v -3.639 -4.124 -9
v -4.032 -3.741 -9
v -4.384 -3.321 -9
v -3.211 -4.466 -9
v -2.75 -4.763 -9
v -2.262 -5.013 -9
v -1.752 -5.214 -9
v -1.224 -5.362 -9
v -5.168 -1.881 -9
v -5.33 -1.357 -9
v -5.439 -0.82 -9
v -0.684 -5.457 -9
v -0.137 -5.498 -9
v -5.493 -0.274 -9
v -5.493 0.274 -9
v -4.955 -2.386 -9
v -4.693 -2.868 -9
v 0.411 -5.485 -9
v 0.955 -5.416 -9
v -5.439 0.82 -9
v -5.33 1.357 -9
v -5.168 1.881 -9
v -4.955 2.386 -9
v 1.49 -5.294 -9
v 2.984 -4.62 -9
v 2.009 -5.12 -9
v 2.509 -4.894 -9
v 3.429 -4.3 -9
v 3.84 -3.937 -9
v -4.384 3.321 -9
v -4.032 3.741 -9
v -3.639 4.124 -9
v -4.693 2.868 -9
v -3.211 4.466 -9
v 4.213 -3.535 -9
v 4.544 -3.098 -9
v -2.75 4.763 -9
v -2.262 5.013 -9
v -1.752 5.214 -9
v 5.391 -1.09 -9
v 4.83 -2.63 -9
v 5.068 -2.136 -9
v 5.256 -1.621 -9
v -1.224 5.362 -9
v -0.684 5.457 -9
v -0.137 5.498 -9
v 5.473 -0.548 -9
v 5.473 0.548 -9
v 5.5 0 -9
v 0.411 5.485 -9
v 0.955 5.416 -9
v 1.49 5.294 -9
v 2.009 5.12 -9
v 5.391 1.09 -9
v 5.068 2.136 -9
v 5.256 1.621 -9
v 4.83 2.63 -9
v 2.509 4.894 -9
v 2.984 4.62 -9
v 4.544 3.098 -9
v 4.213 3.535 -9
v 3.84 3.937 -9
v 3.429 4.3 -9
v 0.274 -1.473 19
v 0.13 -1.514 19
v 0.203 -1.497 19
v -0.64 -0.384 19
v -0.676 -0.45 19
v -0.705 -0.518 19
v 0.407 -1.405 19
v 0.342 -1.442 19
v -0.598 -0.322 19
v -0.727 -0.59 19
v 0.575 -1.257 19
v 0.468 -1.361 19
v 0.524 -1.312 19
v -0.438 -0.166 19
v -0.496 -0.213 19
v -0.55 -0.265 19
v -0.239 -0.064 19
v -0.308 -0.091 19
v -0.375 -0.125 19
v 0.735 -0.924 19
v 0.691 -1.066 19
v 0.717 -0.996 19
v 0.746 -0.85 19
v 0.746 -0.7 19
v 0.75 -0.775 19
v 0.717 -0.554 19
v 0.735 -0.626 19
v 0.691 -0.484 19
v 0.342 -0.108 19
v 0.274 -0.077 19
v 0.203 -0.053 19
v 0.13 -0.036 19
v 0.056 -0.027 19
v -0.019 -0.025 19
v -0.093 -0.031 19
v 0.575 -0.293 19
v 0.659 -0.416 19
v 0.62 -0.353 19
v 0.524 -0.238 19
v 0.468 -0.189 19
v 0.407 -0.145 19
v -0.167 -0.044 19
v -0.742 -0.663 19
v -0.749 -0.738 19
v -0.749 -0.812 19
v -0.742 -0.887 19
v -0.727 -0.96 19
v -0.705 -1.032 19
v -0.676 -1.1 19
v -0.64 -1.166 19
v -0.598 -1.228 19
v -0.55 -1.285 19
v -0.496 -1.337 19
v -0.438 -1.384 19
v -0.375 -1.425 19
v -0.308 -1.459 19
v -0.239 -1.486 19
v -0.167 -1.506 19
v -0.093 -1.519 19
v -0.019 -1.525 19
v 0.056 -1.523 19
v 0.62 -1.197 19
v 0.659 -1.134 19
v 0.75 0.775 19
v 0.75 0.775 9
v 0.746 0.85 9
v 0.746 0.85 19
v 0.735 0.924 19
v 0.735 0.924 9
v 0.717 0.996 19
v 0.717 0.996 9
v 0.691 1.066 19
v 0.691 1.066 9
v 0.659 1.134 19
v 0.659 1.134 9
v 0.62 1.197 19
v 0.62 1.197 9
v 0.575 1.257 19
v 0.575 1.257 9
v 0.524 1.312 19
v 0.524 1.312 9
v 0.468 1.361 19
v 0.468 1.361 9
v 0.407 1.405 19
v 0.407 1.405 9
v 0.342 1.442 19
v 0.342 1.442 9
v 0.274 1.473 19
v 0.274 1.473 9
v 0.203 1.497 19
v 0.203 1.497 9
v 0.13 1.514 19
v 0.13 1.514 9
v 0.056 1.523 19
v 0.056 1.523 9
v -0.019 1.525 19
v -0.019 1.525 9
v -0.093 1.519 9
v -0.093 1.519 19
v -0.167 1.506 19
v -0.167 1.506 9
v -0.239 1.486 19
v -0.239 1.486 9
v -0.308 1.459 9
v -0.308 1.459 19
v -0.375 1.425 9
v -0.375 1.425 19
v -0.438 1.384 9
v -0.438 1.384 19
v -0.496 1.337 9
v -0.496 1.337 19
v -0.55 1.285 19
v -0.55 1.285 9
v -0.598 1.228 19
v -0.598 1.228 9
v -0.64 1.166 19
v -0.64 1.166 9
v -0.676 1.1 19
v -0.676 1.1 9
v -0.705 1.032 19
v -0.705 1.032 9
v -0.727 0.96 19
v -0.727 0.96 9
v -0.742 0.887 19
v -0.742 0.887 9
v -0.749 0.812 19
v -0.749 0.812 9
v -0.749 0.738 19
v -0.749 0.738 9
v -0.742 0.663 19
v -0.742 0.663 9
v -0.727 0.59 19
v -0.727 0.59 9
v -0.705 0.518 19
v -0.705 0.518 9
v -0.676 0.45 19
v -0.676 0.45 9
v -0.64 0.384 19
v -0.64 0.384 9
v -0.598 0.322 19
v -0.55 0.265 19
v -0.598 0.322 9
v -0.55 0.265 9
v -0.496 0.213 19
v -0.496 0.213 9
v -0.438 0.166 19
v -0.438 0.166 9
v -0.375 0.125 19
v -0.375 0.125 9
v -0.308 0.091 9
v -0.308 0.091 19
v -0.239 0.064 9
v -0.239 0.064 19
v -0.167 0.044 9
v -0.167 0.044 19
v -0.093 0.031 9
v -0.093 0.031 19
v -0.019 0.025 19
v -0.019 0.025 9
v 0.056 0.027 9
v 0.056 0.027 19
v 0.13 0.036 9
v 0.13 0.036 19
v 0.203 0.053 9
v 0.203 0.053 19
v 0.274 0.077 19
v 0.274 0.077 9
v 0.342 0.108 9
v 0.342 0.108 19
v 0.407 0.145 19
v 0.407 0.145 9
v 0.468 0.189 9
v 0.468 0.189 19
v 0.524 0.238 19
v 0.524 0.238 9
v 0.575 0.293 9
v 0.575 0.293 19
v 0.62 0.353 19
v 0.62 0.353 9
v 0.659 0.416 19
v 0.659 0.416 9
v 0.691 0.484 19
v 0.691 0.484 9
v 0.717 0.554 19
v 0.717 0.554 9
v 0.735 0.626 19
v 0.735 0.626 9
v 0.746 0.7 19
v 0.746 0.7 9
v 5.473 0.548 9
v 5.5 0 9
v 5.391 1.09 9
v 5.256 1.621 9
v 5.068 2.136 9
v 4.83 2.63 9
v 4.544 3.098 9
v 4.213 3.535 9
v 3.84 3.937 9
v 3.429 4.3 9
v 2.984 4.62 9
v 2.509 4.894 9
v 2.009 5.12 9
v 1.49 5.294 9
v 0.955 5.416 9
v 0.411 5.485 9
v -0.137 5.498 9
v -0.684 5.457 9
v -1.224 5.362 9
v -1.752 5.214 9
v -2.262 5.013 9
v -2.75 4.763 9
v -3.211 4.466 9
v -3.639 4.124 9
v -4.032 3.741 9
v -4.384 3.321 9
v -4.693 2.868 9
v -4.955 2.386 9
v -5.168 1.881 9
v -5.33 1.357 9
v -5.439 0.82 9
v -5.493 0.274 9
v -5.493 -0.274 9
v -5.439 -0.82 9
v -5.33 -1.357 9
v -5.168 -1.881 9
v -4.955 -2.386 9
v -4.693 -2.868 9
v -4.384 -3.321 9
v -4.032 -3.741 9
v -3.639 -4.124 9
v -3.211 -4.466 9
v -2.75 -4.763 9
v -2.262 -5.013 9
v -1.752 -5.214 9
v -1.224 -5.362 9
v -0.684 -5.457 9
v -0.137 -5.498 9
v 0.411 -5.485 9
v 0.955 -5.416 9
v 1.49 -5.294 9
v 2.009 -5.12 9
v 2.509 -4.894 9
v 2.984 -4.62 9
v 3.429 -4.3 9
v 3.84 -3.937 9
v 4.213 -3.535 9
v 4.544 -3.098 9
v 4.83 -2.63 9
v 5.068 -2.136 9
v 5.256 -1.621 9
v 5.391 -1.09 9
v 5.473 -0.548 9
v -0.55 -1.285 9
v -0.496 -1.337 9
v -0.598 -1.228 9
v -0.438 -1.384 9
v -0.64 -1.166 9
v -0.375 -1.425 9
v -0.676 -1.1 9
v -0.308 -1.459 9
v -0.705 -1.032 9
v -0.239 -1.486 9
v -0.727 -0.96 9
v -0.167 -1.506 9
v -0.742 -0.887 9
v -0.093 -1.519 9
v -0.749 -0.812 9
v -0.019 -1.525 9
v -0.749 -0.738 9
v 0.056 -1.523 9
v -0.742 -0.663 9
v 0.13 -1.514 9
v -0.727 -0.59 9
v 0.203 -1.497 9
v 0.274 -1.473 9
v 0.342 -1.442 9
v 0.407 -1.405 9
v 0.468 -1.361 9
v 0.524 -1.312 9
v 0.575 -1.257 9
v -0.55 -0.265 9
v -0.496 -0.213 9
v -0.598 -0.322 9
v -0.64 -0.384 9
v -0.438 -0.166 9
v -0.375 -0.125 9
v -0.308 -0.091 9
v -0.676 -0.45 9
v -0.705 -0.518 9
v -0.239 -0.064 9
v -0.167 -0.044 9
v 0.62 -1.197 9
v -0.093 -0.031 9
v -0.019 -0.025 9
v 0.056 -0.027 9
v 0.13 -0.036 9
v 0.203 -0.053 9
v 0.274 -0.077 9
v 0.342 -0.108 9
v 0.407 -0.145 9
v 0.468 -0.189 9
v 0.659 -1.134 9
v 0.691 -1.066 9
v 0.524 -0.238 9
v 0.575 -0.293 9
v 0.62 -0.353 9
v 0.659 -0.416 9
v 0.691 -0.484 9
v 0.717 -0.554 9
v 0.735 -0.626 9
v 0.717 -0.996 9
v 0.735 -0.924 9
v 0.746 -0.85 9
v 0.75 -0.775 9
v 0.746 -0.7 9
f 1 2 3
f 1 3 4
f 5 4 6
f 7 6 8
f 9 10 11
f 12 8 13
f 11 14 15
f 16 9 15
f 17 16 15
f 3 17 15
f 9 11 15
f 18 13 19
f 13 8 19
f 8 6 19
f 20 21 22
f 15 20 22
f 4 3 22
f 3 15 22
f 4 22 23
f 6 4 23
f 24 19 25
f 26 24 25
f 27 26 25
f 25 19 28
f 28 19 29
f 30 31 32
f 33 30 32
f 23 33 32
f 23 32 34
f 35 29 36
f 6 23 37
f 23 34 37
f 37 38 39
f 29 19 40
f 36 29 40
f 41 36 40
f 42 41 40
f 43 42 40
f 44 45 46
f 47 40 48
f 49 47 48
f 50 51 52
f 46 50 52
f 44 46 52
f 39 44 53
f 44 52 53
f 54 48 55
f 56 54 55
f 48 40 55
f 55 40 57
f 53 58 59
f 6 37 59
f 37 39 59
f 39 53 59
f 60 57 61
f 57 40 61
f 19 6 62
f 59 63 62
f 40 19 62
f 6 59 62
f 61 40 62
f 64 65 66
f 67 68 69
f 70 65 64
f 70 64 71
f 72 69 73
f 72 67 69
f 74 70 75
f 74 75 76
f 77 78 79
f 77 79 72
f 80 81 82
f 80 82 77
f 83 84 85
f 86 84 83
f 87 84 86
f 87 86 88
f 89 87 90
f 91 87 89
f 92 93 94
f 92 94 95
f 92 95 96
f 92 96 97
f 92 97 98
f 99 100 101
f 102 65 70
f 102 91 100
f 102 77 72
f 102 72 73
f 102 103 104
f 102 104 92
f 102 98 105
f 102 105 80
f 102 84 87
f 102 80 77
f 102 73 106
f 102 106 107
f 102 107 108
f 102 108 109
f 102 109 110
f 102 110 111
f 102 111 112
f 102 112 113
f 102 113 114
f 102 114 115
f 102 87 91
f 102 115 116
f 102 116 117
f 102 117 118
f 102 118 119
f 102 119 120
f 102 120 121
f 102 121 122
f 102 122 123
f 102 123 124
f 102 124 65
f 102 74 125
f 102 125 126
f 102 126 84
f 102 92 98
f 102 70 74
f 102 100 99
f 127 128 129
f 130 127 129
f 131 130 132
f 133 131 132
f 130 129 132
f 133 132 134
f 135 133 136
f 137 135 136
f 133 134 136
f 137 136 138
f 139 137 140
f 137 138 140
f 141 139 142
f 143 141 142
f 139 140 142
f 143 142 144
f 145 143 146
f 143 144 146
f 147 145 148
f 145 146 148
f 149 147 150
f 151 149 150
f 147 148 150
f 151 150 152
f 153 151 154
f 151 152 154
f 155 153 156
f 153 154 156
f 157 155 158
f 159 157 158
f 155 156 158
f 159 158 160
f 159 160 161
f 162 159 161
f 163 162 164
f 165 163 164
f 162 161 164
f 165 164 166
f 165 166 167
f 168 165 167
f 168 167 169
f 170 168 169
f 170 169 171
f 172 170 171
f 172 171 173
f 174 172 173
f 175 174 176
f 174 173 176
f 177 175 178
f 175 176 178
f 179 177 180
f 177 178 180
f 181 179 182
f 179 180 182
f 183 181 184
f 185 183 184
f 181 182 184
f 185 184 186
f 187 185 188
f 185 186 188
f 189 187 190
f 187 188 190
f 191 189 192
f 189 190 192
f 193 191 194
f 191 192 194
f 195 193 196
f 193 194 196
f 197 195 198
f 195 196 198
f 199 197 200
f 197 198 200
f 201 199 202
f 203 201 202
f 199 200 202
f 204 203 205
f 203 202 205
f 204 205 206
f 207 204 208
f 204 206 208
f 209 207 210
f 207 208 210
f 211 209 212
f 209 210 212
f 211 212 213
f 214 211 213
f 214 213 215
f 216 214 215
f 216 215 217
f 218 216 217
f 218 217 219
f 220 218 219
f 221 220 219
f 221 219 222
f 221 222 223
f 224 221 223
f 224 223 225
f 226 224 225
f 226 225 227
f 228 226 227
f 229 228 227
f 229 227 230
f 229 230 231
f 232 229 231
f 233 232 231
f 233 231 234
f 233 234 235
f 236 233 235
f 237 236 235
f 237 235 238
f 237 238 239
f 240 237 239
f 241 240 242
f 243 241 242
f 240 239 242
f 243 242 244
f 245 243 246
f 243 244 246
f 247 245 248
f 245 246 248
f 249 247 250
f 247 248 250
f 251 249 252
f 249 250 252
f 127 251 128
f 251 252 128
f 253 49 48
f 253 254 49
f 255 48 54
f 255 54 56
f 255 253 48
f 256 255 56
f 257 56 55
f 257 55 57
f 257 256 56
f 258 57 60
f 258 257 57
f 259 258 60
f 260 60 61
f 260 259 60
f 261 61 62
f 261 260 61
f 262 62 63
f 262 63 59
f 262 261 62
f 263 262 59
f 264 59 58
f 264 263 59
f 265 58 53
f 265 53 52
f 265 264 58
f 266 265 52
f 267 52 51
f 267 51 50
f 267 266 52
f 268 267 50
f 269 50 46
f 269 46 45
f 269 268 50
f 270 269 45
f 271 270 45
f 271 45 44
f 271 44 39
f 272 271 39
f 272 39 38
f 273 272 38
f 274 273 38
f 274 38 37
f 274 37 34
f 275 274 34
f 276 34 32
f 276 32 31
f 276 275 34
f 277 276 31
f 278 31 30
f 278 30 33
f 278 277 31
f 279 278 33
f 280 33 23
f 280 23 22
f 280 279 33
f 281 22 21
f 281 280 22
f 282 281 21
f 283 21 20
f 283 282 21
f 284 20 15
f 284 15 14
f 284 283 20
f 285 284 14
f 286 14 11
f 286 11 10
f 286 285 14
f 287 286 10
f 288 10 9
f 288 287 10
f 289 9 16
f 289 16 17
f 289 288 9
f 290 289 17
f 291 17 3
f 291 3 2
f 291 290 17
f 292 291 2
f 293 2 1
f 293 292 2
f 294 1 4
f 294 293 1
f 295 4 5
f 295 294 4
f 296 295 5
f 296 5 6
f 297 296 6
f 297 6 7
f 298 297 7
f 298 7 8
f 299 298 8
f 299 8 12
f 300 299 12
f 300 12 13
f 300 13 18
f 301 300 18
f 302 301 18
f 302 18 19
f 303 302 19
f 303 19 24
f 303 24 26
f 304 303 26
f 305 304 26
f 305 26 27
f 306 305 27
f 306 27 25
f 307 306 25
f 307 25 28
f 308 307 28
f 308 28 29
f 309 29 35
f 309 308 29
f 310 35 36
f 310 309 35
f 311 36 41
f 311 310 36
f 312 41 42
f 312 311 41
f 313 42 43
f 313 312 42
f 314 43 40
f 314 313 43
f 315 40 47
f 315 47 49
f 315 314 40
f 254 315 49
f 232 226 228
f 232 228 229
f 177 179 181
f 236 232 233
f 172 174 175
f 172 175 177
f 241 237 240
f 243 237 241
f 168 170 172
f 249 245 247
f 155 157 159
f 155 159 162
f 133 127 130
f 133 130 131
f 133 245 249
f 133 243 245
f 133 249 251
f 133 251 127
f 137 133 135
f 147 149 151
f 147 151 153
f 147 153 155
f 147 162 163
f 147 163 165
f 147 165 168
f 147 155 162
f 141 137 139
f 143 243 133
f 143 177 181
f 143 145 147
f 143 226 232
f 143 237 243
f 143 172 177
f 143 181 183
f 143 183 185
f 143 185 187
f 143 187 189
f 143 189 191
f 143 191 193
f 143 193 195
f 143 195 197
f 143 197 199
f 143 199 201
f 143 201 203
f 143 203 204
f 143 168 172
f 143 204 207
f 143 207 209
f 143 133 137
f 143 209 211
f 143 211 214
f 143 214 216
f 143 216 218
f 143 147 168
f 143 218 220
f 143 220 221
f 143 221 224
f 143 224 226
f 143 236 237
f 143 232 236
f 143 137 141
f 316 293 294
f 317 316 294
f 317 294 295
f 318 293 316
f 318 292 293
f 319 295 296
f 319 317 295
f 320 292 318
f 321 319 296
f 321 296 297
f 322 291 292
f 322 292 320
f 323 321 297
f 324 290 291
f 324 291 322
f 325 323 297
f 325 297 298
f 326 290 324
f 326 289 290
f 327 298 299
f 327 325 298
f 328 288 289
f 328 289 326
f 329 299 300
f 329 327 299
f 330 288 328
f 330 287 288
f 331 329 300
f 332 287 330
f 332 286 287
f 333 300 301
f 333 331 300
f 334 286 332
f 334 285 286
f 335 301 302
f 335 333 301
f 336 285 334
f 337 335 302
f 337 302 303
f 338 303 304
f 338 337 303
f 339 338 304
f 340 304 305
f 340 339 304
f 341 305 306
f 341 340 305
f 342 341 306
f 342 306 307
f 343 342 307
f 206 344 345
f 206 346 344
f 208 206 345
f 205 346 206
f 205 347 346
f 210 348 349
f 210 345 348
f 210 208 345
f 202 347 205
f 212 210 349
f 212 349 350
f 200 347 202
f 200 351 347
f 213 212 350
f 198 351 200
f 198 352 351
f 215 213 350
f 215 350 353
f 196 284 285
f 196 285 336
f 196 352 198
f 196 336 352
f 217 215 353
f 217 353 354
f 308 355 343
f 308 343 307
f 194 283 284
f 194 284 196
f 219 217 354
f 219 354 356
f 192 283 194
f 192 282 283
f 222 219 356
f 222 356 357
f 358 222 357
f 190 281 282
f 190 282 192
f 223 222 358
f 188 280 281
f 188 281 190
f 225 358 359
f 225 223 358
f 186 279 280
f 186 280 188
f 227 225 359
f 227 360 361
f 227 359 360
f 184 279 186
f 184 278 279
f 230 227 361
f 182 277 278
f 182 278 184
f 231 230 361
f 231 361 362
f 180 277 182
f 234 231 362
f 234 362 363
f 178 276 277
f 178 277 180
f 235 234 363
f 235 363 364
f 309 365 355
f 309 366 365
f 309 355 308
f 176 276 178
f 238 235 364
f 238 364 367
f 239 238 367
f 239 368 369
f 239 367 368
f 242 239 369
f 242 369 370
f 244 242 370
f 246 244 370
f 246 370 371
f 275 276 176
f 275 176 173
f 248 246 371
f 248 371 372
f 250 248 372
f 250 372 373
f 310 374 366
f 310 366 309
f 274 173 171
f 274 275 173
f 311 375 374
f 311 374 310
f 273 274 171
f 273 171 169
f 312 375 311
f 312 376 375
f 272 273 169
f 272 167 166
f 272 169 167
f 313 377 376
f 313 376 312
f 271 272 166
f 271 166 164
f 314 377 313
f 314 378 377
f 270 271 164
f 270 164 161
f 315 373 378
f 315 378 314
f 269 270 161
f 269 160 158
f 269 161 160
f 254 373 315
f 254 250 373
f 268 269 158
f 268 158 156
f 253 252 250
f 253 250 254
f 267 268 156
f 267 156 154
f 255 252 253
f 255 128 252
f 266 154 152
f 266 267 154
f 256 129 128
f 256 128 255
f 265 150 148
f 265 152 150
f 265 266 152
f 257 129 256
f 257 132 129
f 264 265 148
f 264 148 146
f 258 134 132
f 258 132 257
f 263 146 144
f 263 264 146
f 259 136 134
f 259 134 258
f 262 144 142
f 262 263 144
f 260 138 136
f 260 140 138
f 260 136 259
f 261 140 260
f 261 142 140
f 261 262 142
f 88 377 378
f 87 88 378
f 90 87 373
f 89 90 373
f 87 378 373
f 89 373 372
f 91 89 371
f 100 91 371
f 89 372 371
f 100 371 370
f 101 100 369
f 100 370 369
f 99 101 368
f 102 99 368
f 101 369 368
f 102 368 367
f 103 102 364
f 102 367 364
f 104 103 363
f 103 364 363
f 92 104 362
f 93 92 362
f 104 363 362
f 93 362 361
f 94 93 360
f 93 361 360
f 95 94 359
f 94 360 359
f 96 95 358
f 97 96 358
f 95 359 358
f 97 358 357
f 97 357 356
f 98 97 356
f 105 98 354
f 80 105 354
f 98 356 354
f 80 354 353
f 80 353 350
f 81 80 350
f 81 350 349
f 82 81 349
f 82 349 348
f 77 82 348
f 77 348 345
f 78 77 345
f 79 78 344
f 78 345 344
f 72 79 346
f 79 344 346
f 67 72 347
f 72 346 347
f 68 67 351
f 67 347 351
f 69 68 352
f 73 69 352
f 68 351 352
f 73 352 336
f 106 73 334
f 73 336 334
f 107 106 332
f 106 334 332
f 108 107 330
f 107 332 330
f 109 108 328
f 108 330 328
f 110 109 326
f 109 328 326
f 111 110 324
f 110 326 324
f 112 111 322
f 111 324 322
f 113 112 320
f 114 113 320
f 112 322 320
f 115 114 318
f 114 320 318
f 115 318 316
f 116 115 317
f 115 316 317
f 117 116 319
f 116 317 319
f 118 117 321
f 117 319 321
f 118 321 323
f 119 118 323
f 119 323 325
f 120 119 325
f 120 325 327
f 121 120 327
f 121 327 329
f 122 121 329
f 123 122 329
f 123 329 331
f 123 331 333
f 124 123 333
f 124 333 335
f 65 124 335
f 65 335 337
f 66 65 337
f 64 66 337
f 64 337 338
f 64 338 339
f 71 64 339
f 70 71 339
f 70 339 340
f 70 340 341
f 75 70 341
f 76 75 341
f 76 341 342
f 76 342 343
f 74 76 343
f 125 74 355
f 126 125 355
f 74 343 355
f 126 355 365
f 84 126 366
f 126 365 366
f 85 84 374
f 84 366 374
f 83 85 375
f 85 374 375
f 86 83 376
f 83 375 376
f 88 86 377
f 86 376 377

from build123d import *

# Parameters (mm, degrees)
SKETCH_1_R        = 5.5
EXTRUDE_311_DEPTH = 9
SKETCH_2_R        = 0.75
EXTRUDE_525_DEPTH = 10


with BuildPart() as part:
    # Эскиз1 → Extrude 311 (new, symmetric)
    with BuildSketch(Plane.XY):
        Circle(SKETCH_1_R)
    extrude(amount=EXTRUDE_311_DEPTH, both=True)

    # Эскиз2 → Extrude 525 (add)
    with BuildSketch(Plane.XY.offset(9)):
        with Locations((0, -0.775)):
            Circle(SKETCH_2_R)
        with Locations((0, 0.775)):
            Circle(SKETCH_2_R)
    extrude(amount=EXTRUDE_525_DEPTH)


solid = part.part
